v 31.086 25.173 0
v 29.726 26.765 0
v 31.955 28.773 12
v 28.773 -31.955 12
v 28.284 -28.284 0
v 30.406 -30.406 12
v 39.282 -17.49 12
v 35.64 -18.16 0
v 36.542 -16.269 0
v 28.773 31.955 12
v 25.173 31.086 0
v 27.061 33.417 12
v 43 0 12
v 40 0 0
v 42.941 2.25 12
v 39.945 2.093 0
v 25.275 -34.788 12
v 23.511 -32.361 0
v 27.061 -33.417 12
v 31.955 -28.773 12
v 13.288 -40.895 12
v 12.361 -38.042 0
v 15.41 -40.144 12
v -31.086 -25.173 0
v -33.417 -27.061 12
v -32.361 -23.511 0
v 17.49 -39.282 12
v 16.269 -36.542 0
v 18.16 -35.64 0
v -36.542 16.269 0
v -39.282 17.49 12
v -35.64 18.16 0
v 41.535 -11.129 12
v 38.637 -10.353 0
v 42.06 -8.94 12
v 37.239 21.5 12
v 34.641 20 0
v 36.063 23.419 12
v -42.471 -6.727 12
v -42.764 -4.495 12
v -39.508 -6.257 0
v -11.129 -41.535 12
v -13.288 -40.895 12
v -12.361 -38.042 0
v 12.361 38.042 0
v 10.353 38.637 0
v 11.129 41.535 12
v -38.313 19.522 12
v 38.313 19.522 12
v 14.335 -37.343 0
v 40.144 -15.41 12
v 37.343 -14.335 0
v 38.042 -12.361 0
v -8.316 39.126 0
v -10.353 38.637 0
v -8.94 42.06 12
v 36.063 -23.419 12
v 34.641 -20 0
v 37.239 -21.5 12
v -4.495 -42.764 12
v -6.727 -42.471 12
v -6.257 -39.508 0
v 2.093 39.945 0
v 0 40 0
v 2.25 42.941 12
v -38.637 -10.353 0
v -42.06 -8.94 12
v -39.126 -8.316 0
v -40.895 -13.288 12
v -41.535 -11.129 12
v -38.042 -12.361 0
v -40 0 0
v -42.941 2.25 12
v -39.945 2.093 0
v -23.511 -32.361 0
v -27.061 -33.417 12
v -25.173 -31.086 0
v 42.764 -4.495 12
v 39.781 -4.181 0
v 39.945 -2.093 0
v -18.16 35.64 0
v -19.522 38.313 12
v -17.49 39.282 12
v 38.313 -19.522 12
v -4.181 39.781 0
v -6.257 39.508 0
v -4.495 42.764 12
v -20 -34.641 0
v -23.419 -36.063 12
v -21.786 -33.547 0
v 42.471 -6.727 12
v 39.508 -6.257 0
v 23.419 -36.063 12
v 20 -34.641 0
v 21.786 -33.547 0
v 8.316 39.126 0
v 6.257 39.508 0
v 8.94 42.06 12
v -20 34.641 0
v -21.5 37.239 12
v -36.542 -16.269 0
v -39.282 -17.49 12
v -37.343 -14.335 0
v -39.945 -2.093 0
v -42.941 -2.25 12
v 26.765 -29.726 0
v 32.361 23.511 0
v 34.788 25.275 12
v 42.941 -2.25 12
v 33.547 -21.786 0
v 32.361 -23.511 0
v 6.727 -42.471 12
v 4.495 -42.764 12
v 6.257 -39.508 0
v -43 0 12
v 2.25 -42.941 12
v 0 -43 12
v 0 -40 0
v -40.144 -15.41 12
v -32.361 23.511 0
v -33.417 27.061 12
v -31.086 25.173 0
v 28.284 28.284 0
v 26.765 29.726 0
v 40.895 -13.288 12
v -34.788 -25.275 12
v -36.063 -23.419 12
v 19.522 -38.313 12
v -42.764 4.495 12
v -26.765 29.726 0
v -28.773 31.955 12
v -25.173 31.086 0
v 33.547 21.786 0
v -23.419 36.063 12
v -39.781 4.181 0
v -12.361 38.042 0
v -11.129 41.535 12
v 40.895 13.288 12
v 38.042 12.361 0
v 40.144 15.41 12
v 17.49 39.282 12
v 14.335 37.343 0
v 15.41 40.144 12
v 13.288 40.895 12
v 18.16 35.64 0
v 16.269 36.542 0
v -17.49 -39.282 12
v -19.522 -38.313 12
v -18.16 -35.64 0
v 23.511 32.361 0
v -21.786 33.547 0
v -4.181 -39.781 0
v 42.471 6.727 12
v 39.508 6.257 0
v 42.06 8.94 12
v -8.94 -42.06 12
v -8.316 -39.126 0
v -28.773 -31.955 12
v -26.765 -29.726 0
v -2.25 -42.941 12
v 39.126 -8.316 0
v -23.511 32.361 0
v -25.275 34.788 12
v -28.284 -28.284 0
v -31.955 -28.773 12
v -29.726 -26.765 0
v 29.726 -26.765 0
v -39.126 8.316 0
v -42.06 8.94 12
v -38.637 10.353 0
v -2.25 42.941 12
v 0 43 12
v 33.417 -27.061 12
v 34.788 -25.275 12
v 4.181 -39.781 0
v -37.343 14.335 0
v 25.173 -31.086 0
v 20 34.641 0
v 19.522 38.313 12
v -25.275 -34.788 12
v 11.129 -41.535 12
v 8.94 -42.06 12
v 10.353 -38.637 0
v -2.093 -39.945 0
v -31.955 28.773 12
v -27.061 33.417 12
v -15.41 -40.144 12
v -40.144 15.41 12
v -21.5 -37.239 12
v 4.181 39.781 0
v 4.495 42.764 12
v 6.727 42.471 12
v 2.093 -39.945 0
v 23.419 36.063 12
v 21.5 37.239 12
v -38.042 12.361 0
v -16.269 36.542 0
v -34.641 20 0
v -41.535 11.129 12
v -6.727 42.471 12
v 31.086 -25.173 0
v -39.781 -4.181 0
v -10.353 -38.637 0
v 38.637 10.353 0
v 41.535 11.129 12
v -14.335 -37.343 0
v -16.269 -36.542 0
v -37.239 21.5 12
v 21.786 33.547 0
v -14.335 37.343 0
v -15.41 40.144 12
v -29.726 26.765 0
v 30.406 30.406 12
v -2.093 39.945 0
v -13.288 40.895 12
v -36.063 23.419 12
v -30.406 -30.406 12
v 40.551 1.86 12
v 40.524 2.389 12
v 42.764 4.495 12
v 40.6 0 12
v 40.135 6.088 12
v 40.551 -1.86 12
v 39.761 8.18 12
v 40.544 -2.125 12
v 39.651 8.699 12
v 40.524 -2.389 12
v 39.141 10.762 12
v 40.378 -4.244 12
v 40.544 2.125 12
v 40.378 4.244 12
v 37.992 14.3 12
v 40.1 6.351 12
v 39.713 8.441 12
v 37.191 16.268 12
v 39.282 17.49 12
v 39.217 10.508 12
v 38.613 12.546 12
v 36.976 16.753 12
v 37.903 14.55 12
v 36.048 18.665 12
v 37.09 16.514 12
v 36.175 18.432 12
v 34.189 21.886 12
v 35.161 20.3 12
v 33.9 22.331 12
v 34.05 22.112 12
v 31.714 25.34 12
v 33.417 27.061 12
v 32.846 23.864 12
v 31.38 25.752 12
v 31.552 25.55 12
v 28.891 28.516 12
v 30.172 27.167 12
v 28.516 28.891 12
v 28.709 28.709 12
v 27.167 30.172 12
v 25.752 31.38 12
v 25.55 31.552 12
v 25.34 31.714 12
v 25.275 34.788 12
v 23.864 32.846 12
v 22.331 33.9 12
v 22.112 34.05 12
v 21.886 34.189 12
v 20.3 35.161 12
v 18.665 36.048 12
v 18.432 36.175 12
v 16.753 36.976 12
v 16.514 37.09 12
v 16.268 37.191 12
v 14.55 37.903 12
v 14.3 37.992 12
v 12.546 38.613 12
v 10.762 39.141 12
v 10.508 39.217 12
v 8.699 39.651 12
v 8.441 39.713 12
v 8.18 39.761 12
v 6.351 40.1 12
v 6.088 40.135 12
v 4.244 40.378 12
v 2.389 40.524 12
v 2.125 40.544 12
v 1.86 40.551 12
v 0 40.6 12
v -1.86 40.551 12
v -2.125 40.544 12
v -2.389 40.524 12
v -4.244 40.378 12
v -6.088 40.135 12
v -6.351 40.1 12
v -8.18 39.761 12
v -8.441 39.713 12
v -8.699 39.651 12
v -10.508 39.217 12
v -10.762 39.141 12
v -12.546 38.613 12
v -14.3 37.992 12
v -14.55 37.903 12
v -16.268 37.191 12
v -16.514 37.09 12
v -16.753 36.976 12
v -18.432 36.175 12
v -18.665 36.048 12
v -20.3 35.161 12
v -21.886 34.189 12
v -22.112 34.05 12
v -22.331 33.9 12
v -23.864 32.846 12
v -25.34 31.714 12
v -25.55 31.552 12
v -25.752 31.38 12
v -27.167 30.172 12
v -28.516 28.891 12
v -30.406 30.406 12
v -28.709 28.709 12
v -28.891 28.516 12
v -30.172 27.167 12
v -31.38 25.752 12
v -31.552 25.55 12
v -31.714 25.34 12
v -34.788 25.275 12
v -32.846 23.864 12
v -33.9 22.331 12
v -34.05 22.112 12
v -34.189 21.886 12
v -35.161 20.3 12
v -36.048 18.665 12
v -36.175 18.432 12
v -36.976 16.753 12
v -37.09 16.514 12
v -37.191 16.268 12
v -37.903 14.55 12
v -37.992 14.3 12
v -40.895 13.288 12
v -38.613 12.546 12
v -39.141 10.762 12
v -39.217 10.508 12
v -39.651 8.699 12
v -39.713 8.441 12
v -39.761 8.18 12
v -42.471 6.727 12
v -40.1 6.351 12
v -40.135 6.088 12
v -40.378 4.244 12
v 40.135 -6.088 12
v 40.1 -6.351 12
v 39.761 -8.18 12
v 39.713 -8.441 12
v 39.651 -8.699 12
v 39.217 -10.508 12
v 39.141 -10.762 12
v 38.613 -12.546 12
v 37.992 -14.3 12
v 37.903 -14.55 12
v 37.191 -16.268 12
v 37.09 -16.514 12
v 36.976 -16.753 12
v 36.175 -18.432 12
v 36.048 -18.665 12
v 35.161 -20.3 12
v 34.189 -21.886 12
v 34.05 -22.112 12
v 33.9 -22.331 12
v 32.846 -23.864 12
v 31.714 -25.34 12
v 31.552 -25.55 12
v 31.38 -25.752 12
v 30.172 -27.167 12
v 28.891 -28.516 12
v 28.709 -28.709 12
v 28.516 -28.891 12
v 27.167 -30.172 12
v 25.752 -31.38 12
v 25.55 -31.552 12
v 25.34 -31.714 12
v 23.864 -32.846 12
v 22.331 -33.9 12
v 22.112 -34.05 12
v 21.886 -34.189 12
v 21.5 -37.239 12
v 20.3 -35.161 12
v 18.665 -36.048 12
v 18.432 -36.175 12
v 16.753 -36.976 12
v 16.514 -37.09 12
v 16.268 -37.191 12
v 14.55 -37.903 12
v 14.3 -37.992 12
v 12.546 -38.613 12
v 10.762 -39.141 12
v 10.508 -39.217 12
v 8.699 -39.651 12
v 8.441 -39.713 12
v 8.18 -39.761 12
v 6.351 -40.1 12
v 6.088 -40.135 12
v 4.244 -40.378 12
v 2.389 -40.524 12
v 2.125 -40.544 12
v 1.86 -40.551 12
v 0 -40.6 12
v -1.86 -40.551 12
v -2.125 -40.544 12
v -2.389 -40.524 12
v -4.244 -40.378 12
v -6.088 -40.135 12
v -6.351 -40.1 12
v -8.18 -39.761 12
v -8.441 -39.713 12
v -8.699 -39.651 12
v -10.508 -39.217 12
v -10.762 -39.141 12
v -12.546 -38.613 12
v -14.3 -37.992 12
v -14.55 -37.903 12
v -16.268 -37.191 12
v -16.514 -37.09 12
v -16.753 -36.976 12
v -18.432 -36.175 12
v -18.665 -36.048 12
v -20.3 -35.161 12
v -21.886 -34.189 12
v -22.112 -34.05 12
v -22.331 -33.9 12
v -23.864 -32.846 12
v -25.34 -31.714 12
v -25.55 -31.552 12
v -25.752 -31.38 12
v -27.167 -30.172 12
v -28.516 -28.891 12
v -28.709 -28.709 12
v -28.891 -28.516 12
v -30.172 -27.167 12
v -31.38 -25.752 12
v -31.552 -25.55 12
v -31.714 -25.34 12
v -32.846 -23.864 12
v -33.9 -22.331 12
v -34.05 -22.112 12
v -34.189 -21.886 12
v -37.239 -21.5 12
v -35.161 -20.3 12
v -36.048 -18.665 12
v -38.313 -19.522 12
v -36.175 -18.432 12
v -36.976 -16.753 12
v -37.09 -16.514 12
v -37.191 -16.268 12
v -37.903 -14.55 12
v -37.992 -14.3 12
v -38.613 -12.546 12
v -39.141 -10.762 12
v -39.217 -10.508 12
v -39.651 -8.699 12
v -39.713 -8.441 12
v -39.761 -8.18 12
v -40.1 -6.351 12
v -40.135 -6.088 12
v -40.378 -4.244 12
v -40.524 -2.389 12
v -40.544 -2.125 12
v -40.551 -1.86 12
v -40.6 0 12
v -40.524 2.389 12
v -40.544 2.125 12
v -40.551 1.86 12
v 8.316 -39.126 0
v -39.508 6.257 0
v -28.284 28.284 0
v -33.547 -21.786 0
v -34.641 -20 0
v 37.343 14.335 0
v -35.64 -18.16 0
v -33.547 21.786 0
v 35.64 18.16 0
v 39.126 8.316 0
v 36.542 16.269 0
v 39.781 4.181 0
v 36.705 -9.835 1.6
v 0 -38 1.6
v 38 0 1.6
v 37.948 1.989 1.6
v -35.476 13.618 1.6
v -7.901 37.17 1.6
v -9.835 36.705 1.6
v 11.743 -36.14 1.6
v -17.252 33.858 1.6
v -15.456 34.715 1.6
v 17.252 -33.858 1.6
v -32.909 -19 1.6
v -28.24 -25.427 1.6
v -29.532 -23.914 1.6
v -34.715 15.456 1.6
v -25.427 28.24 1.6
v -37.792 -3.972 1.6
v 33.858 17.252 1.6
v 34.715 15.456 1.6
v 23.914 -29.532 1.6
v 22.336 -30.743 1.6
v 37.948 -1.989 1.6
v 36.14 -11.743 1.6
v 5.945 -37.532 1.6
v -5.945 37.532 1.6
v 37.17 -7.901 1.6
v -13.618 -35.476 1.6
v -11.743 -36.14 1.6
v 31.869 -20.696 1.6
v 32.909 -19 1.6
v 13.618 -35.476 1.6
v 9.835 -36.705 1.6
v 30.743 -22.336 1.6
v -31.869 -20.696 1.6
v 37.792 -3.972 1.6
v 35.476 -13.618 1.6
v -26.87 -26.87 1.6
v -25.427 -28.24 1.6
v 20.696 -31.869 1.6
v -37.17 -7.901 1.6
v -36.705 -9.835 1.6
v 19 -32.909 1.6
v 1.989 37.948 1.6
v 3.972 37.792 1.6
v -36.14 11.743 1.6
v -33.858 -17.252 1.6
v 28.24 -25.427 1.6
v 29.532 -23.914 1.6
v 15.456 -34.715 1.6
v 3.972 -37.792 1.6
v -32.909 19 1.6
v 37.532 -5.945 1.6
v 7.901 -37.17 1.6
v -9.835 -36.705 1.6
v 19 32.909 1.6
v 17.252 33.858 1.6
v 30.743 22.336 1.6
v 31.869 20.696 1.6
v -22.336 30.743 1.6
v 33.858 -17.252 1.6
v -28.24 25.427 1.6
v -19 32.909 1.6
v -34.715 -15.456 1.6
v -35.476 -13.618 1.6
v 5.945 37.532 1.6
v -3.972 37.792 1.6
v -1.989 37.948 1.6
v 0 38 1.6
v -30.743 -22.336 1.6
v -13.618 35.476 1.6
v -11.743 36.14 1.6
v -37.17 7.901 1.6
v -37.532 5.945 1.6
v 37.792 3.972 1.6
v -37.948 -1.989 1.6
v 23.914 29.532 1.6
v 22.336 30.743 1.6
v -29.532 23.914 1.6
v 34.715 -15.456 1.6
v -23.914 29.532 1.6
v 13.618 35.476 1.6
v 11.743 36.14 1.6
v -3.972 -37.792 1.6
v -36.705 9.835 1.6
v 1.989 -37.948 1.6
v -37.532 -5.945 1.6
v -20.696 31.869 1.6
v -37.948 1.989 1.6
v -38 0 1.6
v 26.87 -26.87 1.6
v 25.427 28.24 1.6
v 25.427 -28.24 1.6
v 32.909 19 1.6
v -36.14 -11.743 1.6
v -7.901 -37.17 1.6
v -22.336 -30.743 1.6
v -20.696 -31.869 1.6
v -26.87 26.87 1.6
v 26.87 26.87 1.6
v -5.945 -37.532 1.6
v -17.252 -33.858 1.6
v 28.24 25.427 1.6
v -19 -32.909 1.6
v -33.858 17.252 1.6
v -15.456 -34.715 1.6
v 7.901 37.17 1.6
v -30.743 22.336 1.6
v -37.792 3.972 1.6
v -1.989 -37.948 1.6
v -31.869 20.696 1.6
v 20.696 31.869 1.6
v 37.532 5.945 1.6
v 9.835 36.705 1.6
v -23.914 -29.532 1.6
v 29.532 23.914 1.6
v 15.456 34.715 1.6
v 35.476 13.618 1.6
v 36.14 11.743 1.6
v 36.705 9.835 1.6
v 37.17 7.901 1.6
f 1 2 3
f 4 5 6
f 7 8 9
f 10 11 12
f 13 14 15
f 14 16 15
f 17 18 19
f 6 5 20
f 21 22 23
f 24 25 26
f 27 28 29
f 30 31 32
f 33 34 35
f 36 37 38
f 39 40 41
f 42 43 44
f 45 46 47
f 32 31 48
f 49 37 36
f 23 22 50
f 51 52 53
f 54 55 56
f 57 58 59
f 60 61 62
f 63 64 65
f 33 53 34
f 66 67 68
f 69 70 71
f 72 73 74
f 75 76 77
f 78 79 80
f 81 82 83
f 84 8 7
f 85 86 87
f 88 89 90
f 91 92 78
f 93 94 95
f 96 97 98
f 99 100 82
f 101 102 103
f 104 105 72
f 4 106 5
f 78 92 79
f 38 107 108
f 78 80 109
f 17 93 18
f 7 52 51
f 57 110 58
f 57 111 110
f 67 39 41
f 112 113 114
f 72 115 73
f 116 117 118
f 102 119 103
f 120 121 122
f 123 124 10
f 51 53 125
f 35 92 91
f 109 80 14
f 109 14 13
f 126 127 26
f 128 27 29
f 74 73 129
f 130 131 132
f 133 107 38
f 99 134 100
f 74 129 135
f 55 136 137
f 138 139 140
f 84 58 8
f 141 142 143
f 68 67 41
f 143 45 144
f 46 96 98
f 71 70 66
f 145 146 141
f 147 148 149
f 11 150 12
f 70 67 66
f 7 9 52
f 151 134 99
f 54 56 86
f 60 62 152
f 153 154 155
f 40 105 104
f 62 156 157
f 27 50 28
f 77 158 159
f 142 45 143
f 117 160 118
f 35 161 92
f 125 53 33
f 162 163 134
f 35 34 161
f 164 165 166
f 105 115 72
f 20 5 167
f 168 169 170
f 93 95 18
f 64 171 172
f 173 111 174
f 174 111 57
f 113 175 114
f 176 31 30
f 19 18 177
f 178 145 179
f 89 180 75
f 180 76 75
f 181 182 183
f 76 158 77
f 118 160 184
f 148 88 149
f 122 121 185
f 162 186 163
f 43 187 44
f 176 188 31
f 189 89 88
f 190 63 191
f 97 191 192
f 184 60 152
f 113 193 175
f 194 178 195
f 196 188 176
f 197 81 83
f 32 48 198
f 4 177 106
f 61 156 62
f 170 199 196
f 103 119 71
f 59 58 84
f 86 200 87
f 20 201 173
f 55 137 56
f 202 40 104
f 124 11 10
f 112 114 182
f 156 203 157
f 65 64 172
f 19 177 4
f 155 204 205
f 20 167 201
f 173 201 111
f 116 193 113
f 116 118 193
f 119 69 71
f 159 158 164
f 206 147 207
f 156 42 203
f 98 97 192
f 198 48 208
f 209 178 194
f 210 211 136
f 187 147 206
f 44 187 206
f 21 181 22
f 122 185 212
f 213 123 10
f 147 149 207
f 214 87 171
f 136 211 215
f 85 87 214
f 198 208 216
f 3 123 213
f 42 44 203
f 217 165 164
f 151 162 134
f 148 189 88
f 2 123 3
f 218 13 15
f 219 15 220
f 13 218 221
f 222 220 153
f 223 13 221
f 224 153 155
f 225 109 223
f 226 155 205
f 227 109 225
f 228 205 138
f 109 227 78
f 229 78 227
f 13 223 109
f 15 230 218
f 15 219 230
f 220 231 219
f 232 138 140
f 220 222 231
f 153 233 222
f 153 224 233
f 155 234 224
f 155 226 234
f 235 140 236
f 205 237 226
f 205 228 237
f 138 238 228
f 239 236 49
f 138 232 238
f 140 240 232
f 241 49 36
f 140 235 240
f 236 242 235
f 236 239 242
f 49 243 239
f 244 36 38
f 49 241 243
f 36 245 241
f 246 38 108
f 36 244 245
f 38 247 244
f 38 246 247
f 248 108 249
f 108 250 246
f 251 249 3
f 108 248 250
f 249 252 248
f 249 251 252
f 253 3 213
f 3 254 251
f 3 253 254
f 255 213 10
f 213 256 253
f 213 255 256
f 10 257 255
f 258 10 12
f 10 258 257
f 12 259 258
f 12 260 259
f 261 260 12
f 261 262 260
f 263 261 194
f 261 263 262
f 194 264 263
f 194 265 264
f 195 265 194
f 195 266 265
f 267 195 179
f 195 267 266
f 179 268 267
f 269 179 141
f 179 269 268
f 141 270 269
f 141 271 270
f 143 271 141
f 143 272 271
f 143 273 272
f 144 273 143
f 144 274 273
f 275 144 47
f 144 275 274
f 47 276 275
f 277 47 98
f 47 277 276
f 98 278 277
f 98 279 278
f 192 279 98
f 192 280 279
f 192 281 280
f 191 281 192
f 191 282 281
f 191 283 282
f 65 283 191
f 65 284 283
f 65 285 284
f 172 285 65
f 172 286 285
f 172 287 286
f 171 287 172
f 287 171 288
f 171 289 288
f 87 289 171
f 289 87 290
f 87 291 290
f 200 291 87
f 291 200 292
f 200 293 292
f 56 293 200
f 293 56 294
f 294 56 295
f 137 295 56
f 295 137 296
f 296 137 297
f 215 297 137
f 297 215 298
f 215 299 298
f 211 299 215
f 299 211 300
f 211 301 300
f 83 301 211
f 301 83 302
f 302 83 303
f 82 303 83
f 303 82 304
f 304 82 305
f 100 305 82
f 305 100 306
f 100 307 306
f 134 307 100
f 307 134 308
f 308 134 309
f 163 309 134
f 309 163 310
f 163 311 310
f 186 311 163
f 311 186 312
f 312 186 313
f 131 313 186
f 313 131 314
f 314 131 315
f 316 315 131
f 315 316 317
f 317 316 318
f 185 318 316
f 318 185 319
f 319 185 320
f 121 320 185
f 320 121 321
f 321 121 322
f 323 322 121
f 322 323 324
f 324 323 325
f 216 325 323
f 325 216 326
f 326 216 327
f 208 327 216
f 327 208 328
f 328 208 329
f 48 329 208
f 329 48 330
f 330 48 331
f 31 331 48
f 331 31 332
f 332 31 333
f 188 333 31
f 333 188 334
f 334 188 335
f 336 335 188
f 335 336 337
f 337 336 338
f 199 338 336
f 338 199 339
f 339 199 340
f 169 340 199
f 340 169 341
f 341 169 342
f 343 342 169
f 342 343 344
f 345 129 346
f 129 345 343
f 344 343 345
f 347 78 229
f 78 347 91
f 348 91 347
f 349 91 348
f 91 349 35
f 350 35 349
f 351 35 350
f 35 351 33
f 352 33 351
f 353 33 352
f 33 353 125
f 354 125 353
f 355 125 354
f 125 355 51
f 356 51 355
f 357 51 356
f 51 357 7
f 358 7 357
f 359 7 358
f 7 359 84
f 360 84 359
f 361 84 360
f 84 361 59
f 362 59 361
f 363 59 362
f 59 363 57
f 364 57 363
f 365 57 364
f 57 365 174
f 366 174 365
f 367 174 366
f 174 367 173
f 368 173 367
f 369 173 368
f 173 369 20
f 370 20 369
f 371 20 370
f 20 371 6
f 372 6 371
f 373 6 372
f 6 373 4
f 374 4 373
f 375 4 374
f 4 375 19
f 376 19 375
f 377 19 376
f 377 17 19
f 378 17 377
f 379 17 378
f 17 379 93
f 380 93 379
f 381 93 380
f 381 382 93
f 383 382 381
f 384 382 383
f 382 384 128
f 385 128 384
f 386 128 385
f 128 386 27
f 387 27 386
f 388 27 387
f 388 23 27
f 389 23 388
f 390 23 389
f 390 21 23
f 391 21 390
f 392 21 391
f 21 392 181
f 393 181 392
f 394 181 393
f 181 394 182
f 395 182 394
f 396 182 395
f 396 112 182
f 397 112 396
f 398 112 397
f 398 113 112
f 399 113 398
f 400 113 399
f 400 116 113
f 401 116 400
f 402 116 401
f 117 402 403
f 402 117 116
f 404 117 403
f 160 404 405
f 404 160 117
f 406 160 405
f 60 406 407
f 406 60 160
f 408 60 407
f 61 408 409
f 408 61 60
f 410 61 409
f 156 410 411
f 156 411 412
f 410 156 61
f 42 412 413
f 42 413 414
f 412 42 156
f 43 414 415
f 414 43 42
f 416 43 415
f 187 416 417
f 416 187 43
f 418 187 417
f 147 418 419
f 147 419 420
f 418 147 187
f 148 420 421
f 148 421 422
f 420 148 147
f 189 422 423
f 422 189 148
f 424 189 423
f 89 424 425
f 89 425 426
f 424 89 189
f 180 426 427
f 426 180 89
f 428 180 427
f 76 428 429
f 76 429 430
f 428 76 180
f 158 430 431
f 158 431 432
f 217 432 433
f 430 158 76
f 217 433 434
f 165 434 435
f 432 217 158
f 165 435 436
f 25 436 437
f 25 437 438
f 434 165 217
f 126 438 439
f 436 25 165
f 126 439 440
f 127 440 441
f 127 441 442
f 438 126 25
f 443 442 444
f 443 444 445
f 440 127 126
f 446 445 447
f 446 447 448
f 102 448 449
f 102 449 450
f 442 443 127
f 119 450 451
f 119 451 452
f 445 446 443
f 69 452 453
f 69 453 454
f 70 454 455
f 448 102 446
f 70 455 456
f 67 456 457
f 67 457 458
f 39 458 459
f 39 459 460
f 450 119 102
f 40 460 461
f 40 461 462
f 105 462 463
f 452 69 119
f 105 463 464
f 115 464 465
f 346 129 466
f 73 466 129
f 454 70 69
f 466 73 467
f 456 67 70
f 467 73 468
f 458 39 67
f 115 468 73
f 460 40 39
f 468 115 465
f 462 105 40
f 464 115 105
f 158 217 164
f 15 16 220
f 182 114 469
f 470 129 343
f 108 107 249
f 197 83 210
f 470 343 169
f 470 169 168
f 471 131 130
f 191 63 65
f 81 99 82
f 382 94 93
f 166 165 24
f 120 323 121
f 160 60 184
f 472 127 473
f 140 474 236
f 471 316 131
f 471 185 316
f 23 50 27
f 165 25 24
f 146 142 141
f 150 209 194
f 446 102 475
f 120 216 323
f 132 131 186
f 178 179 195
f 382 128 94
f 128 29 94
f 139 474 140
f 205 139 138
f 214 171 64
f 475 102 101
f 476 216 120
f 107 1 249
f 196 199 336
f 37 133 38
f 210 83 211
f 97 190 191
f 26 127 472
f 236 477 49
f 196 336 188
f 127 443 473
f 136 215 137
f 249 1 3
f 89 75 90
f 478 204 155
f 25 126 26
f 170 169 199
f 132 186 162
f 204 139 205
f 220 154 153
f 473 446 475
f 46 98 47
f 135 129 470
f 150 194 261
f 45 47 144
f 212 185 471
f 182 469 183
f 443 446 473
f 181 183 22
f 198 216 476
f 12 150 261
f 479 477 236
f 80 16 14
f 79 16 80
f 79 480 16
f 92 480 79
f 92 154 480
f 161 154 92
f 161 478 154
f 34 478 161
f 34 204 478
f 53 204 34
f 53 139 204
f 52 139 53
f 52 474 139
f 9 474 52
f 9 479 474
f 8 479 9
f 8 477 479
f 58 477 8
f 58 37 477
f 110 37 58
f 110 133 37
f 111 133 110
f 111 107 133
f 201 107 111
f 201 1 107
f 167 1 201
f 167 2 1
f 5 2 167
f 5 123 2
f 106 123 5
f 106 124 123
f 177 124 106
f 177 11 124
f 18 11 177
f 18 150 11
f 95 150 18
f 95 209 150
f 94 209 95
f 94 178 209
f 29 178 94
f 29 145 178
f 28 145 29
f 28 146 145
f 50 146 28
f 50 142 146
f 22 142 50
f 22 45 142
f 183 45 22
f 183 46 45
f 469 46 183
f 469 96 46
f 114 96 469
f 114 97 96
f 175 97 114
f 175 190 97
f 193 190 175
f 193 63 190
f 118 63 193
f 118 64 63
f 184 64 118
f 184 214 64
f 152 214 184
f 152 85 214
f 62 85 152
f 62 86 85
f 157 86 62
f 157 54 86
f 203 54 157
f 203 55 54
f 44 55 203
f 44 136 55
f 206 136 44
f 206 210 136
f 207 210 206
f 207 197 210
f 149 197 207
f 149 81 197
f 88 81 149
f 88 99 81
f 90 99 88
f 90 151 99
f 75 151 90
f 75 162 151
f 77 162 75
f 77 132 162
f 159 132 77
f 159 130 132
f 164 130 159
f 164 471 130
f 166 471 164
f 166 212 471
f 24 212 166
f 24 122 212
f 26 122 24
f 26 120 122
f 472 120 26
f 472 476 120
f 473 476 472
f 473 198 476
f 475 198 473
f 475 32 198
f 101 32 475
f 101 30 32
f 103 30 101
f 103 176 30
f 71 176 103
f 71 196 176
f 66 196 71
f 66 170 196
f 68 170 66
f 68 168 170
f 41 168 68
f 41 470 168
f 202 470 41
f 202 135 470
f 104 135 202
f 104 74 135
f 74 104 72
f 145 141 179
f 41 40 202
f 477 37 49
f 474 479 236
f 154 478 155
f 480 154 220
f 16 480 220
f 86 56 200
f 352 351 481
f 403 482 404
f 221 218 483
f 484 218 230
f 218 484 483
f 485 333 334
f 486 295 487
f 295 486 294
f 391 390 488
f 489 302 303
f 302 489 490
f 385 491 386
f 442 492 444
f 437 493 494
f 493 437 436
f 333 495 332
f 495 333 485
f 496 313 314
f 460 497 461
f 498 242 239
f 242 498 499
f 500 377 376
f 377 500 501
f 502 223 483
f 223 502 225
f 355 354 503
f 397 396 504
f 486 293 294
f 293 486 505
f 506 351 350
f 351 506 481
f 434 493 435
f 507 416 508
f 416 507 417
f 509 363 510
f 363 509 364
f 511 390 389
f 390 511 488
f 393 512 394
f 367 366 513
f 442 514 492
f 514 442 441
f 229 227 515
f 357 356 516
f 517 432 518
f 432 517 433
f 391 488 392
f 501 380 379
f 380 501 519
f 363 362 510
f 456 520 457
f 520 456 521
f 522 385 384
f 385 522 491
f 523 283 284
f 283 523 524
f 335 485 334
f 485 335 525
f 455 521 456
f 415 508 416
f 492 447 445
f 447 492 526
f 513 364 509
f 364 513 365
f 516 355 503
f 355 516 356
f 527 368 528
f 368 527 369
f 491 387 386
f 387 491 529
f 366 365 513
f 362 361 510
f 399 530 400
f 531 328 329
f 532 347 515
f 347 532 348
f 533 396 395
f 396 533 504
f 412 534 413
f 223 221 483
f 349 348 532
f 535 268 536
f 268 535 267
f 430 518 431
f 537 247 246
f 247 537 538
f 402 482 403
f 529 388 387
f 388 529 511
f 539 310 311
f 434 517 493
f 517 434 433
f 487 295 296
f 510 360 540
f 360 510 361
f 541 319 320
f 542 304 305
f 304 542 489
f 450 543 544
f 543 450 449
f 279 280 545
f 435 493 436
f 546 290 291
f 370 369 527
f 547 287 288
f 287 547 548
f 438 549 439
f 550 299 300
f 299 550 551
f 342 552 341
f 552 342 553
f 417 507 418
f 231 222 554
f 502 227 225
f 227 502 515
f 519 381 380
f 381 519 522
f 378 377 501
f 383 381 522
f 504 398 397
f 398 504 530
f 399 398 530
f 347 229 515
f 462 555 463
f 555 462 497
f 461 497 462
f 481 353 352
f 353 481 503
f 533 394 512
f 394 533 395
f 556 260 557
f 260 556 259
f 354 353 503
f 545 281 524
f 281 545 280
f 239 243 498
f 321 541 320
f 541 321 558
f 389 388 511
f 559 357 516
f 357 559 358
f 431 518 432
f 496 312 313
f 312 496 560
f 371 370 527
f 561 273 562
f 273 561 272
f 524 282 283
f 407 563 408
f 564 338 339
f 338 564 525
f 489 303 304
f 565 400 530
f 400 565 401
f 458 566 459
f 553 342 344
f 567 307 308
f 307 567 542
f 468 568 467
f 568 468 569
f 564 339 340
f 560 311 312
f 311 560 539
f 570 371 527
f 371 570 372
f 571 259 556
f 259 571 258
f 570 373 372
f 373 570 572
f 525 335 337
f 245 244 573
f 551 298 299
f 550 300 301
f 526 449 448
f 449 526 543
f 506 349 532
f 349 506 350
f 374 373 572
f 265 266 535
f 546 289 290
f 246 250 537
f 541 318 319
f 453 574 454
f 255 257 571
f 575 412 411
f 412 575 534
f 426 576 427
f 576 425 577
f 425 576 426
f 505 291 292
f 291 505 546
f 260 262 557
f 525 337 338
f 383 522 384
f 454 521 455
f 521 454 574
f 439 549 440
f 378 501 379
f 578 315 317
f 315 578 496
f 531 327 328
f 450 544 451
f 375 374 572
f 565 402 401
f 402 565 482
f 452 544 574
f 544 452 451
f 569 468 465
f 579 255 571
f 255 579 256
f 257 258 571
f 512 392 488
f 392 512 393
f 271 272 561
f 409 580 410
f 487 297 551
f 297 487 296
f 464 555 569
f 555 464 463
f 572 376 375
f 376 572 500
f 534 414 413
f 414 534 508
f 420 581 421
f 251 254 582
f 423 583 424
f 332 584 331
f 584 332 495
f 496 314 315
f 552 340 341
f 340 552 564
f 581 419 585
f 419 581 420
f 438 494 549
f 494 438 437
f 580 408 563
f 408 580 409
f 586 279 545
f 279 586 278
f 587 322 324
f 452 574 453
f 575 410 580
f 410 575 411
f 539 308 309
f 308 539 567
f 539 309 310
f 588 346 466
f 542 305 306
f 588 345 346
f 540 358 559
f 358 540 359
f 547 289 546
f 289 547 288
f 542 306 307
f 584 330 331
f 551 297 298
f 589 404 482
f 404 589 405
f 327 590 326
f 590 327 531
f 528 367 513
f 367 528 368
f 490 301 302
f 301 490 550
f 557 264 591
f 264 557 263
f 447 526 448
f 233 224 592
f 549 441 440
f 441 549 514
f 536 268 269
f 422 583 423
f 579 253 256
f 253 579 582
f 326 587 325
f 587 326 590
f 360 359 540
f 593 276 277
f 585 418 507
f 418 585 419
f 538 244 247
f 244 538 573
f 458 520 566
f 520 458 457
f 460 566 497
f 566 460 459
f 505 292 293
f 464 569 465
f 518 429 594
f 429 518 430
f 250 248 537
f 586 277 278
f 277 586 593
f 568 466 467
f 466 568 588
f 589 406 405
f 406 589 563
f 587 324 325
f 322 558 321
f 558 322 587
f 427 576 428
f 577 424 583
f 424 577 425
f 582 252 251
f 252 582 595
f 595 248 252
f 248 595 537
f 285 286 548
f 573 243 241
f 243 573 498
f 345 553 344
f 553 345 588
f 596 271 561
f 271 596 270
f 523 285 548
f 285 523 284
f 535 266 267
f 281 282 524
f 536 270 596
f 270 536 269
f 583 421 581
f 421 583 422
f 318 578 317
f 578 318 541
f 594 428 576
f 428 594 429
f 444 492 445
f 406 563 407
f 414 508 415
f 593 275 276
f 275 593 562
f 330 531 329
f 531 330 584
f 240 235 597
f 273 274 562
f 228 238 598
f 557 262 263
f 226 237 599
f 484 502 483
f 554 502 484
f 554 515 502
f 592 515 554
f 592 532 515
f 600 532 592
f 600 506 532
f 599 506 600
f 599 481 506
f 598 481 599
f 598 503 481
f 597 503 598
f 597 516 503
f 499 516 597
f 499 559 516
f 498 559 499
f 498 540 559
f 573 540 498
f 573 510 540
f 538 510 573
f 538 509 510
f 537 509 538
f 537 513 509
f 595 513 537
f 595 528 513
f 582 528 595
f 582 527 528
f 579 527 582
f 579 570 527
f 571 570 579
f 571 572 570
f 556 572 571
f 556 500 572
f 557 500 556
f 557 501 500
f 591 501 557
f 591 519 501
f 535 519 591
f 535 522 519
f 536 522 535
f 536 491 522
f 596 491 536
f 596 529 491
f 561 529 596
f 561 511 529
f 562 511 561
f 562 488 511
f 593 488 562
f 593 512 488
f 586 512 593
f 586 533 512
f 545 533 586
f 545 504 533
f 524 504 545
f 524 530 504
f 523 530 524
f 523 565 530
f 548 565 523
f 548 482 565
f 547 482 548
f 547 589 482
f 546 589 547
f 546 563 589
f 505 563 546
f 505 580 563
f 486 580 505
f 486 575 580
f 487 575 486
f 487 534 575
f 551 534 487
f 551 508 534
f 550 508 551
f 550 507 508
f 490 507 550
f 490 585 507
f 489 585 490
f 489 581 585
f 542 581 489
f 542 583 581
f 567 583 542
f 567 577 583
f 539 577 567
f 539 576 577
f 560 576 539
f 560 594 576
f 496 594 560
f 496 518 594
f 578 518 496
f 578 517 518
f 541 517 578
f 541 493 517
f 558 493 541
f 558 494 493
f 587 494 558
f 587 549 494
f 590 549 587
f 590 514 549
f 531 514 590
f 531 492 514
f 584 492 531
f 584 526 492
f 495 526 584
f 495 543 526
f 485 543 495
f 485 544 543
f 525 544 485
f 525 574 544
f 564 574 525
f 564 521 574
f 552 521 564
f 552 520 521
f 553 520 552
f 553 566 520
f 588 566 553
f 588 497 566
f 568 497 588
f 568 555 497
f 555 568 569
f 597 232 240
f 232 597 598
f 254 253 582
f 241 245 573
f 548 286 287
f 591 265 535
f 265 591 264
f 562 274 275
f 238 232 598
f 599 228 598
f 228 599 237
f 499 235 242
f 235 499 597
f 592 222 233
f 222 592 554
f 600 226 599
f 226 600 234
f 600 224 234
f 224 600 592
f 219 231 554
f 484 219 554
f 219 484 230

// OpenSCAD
// file: ../lib/params.scad
// Shared sizes for the pot and its saucer.
/* [Size] */
// Rim diameter (mm)
pot_top_d = 90; // [50:1:160]
// Base diameter (mm)
pot_bottom_d = 70; // [40:1:140]
// Height (mm)
pot_h = 80; // [40:1:160]
// Wall thickness (mm)
pot_wall = 1.8; // [1.2:0.2:3]

/* [Saucer] */
// Room around the pot (mm)
saucer_gap = 3; // [1:0.5:8]
// Saucer height (mm)
saucer_h = 12; // [6:1:25]
// main file
// Saucer for the plant pot: catches the water that drains through.

/* [Hidden] */
include <../lib/params.scad>
$fn = $preview ? 48 : 120;
d = pot_bottom_d + 2 * saucer_gap + 2 * 2;

difference() {
  cylinder(d1 = d, d2 = d + 6, h = saucer_h);
  translate([0, 0, 1.6]) cylinder(d1 = d - 4, d2 = d + 6 - 4, h = saucer_h);
}
